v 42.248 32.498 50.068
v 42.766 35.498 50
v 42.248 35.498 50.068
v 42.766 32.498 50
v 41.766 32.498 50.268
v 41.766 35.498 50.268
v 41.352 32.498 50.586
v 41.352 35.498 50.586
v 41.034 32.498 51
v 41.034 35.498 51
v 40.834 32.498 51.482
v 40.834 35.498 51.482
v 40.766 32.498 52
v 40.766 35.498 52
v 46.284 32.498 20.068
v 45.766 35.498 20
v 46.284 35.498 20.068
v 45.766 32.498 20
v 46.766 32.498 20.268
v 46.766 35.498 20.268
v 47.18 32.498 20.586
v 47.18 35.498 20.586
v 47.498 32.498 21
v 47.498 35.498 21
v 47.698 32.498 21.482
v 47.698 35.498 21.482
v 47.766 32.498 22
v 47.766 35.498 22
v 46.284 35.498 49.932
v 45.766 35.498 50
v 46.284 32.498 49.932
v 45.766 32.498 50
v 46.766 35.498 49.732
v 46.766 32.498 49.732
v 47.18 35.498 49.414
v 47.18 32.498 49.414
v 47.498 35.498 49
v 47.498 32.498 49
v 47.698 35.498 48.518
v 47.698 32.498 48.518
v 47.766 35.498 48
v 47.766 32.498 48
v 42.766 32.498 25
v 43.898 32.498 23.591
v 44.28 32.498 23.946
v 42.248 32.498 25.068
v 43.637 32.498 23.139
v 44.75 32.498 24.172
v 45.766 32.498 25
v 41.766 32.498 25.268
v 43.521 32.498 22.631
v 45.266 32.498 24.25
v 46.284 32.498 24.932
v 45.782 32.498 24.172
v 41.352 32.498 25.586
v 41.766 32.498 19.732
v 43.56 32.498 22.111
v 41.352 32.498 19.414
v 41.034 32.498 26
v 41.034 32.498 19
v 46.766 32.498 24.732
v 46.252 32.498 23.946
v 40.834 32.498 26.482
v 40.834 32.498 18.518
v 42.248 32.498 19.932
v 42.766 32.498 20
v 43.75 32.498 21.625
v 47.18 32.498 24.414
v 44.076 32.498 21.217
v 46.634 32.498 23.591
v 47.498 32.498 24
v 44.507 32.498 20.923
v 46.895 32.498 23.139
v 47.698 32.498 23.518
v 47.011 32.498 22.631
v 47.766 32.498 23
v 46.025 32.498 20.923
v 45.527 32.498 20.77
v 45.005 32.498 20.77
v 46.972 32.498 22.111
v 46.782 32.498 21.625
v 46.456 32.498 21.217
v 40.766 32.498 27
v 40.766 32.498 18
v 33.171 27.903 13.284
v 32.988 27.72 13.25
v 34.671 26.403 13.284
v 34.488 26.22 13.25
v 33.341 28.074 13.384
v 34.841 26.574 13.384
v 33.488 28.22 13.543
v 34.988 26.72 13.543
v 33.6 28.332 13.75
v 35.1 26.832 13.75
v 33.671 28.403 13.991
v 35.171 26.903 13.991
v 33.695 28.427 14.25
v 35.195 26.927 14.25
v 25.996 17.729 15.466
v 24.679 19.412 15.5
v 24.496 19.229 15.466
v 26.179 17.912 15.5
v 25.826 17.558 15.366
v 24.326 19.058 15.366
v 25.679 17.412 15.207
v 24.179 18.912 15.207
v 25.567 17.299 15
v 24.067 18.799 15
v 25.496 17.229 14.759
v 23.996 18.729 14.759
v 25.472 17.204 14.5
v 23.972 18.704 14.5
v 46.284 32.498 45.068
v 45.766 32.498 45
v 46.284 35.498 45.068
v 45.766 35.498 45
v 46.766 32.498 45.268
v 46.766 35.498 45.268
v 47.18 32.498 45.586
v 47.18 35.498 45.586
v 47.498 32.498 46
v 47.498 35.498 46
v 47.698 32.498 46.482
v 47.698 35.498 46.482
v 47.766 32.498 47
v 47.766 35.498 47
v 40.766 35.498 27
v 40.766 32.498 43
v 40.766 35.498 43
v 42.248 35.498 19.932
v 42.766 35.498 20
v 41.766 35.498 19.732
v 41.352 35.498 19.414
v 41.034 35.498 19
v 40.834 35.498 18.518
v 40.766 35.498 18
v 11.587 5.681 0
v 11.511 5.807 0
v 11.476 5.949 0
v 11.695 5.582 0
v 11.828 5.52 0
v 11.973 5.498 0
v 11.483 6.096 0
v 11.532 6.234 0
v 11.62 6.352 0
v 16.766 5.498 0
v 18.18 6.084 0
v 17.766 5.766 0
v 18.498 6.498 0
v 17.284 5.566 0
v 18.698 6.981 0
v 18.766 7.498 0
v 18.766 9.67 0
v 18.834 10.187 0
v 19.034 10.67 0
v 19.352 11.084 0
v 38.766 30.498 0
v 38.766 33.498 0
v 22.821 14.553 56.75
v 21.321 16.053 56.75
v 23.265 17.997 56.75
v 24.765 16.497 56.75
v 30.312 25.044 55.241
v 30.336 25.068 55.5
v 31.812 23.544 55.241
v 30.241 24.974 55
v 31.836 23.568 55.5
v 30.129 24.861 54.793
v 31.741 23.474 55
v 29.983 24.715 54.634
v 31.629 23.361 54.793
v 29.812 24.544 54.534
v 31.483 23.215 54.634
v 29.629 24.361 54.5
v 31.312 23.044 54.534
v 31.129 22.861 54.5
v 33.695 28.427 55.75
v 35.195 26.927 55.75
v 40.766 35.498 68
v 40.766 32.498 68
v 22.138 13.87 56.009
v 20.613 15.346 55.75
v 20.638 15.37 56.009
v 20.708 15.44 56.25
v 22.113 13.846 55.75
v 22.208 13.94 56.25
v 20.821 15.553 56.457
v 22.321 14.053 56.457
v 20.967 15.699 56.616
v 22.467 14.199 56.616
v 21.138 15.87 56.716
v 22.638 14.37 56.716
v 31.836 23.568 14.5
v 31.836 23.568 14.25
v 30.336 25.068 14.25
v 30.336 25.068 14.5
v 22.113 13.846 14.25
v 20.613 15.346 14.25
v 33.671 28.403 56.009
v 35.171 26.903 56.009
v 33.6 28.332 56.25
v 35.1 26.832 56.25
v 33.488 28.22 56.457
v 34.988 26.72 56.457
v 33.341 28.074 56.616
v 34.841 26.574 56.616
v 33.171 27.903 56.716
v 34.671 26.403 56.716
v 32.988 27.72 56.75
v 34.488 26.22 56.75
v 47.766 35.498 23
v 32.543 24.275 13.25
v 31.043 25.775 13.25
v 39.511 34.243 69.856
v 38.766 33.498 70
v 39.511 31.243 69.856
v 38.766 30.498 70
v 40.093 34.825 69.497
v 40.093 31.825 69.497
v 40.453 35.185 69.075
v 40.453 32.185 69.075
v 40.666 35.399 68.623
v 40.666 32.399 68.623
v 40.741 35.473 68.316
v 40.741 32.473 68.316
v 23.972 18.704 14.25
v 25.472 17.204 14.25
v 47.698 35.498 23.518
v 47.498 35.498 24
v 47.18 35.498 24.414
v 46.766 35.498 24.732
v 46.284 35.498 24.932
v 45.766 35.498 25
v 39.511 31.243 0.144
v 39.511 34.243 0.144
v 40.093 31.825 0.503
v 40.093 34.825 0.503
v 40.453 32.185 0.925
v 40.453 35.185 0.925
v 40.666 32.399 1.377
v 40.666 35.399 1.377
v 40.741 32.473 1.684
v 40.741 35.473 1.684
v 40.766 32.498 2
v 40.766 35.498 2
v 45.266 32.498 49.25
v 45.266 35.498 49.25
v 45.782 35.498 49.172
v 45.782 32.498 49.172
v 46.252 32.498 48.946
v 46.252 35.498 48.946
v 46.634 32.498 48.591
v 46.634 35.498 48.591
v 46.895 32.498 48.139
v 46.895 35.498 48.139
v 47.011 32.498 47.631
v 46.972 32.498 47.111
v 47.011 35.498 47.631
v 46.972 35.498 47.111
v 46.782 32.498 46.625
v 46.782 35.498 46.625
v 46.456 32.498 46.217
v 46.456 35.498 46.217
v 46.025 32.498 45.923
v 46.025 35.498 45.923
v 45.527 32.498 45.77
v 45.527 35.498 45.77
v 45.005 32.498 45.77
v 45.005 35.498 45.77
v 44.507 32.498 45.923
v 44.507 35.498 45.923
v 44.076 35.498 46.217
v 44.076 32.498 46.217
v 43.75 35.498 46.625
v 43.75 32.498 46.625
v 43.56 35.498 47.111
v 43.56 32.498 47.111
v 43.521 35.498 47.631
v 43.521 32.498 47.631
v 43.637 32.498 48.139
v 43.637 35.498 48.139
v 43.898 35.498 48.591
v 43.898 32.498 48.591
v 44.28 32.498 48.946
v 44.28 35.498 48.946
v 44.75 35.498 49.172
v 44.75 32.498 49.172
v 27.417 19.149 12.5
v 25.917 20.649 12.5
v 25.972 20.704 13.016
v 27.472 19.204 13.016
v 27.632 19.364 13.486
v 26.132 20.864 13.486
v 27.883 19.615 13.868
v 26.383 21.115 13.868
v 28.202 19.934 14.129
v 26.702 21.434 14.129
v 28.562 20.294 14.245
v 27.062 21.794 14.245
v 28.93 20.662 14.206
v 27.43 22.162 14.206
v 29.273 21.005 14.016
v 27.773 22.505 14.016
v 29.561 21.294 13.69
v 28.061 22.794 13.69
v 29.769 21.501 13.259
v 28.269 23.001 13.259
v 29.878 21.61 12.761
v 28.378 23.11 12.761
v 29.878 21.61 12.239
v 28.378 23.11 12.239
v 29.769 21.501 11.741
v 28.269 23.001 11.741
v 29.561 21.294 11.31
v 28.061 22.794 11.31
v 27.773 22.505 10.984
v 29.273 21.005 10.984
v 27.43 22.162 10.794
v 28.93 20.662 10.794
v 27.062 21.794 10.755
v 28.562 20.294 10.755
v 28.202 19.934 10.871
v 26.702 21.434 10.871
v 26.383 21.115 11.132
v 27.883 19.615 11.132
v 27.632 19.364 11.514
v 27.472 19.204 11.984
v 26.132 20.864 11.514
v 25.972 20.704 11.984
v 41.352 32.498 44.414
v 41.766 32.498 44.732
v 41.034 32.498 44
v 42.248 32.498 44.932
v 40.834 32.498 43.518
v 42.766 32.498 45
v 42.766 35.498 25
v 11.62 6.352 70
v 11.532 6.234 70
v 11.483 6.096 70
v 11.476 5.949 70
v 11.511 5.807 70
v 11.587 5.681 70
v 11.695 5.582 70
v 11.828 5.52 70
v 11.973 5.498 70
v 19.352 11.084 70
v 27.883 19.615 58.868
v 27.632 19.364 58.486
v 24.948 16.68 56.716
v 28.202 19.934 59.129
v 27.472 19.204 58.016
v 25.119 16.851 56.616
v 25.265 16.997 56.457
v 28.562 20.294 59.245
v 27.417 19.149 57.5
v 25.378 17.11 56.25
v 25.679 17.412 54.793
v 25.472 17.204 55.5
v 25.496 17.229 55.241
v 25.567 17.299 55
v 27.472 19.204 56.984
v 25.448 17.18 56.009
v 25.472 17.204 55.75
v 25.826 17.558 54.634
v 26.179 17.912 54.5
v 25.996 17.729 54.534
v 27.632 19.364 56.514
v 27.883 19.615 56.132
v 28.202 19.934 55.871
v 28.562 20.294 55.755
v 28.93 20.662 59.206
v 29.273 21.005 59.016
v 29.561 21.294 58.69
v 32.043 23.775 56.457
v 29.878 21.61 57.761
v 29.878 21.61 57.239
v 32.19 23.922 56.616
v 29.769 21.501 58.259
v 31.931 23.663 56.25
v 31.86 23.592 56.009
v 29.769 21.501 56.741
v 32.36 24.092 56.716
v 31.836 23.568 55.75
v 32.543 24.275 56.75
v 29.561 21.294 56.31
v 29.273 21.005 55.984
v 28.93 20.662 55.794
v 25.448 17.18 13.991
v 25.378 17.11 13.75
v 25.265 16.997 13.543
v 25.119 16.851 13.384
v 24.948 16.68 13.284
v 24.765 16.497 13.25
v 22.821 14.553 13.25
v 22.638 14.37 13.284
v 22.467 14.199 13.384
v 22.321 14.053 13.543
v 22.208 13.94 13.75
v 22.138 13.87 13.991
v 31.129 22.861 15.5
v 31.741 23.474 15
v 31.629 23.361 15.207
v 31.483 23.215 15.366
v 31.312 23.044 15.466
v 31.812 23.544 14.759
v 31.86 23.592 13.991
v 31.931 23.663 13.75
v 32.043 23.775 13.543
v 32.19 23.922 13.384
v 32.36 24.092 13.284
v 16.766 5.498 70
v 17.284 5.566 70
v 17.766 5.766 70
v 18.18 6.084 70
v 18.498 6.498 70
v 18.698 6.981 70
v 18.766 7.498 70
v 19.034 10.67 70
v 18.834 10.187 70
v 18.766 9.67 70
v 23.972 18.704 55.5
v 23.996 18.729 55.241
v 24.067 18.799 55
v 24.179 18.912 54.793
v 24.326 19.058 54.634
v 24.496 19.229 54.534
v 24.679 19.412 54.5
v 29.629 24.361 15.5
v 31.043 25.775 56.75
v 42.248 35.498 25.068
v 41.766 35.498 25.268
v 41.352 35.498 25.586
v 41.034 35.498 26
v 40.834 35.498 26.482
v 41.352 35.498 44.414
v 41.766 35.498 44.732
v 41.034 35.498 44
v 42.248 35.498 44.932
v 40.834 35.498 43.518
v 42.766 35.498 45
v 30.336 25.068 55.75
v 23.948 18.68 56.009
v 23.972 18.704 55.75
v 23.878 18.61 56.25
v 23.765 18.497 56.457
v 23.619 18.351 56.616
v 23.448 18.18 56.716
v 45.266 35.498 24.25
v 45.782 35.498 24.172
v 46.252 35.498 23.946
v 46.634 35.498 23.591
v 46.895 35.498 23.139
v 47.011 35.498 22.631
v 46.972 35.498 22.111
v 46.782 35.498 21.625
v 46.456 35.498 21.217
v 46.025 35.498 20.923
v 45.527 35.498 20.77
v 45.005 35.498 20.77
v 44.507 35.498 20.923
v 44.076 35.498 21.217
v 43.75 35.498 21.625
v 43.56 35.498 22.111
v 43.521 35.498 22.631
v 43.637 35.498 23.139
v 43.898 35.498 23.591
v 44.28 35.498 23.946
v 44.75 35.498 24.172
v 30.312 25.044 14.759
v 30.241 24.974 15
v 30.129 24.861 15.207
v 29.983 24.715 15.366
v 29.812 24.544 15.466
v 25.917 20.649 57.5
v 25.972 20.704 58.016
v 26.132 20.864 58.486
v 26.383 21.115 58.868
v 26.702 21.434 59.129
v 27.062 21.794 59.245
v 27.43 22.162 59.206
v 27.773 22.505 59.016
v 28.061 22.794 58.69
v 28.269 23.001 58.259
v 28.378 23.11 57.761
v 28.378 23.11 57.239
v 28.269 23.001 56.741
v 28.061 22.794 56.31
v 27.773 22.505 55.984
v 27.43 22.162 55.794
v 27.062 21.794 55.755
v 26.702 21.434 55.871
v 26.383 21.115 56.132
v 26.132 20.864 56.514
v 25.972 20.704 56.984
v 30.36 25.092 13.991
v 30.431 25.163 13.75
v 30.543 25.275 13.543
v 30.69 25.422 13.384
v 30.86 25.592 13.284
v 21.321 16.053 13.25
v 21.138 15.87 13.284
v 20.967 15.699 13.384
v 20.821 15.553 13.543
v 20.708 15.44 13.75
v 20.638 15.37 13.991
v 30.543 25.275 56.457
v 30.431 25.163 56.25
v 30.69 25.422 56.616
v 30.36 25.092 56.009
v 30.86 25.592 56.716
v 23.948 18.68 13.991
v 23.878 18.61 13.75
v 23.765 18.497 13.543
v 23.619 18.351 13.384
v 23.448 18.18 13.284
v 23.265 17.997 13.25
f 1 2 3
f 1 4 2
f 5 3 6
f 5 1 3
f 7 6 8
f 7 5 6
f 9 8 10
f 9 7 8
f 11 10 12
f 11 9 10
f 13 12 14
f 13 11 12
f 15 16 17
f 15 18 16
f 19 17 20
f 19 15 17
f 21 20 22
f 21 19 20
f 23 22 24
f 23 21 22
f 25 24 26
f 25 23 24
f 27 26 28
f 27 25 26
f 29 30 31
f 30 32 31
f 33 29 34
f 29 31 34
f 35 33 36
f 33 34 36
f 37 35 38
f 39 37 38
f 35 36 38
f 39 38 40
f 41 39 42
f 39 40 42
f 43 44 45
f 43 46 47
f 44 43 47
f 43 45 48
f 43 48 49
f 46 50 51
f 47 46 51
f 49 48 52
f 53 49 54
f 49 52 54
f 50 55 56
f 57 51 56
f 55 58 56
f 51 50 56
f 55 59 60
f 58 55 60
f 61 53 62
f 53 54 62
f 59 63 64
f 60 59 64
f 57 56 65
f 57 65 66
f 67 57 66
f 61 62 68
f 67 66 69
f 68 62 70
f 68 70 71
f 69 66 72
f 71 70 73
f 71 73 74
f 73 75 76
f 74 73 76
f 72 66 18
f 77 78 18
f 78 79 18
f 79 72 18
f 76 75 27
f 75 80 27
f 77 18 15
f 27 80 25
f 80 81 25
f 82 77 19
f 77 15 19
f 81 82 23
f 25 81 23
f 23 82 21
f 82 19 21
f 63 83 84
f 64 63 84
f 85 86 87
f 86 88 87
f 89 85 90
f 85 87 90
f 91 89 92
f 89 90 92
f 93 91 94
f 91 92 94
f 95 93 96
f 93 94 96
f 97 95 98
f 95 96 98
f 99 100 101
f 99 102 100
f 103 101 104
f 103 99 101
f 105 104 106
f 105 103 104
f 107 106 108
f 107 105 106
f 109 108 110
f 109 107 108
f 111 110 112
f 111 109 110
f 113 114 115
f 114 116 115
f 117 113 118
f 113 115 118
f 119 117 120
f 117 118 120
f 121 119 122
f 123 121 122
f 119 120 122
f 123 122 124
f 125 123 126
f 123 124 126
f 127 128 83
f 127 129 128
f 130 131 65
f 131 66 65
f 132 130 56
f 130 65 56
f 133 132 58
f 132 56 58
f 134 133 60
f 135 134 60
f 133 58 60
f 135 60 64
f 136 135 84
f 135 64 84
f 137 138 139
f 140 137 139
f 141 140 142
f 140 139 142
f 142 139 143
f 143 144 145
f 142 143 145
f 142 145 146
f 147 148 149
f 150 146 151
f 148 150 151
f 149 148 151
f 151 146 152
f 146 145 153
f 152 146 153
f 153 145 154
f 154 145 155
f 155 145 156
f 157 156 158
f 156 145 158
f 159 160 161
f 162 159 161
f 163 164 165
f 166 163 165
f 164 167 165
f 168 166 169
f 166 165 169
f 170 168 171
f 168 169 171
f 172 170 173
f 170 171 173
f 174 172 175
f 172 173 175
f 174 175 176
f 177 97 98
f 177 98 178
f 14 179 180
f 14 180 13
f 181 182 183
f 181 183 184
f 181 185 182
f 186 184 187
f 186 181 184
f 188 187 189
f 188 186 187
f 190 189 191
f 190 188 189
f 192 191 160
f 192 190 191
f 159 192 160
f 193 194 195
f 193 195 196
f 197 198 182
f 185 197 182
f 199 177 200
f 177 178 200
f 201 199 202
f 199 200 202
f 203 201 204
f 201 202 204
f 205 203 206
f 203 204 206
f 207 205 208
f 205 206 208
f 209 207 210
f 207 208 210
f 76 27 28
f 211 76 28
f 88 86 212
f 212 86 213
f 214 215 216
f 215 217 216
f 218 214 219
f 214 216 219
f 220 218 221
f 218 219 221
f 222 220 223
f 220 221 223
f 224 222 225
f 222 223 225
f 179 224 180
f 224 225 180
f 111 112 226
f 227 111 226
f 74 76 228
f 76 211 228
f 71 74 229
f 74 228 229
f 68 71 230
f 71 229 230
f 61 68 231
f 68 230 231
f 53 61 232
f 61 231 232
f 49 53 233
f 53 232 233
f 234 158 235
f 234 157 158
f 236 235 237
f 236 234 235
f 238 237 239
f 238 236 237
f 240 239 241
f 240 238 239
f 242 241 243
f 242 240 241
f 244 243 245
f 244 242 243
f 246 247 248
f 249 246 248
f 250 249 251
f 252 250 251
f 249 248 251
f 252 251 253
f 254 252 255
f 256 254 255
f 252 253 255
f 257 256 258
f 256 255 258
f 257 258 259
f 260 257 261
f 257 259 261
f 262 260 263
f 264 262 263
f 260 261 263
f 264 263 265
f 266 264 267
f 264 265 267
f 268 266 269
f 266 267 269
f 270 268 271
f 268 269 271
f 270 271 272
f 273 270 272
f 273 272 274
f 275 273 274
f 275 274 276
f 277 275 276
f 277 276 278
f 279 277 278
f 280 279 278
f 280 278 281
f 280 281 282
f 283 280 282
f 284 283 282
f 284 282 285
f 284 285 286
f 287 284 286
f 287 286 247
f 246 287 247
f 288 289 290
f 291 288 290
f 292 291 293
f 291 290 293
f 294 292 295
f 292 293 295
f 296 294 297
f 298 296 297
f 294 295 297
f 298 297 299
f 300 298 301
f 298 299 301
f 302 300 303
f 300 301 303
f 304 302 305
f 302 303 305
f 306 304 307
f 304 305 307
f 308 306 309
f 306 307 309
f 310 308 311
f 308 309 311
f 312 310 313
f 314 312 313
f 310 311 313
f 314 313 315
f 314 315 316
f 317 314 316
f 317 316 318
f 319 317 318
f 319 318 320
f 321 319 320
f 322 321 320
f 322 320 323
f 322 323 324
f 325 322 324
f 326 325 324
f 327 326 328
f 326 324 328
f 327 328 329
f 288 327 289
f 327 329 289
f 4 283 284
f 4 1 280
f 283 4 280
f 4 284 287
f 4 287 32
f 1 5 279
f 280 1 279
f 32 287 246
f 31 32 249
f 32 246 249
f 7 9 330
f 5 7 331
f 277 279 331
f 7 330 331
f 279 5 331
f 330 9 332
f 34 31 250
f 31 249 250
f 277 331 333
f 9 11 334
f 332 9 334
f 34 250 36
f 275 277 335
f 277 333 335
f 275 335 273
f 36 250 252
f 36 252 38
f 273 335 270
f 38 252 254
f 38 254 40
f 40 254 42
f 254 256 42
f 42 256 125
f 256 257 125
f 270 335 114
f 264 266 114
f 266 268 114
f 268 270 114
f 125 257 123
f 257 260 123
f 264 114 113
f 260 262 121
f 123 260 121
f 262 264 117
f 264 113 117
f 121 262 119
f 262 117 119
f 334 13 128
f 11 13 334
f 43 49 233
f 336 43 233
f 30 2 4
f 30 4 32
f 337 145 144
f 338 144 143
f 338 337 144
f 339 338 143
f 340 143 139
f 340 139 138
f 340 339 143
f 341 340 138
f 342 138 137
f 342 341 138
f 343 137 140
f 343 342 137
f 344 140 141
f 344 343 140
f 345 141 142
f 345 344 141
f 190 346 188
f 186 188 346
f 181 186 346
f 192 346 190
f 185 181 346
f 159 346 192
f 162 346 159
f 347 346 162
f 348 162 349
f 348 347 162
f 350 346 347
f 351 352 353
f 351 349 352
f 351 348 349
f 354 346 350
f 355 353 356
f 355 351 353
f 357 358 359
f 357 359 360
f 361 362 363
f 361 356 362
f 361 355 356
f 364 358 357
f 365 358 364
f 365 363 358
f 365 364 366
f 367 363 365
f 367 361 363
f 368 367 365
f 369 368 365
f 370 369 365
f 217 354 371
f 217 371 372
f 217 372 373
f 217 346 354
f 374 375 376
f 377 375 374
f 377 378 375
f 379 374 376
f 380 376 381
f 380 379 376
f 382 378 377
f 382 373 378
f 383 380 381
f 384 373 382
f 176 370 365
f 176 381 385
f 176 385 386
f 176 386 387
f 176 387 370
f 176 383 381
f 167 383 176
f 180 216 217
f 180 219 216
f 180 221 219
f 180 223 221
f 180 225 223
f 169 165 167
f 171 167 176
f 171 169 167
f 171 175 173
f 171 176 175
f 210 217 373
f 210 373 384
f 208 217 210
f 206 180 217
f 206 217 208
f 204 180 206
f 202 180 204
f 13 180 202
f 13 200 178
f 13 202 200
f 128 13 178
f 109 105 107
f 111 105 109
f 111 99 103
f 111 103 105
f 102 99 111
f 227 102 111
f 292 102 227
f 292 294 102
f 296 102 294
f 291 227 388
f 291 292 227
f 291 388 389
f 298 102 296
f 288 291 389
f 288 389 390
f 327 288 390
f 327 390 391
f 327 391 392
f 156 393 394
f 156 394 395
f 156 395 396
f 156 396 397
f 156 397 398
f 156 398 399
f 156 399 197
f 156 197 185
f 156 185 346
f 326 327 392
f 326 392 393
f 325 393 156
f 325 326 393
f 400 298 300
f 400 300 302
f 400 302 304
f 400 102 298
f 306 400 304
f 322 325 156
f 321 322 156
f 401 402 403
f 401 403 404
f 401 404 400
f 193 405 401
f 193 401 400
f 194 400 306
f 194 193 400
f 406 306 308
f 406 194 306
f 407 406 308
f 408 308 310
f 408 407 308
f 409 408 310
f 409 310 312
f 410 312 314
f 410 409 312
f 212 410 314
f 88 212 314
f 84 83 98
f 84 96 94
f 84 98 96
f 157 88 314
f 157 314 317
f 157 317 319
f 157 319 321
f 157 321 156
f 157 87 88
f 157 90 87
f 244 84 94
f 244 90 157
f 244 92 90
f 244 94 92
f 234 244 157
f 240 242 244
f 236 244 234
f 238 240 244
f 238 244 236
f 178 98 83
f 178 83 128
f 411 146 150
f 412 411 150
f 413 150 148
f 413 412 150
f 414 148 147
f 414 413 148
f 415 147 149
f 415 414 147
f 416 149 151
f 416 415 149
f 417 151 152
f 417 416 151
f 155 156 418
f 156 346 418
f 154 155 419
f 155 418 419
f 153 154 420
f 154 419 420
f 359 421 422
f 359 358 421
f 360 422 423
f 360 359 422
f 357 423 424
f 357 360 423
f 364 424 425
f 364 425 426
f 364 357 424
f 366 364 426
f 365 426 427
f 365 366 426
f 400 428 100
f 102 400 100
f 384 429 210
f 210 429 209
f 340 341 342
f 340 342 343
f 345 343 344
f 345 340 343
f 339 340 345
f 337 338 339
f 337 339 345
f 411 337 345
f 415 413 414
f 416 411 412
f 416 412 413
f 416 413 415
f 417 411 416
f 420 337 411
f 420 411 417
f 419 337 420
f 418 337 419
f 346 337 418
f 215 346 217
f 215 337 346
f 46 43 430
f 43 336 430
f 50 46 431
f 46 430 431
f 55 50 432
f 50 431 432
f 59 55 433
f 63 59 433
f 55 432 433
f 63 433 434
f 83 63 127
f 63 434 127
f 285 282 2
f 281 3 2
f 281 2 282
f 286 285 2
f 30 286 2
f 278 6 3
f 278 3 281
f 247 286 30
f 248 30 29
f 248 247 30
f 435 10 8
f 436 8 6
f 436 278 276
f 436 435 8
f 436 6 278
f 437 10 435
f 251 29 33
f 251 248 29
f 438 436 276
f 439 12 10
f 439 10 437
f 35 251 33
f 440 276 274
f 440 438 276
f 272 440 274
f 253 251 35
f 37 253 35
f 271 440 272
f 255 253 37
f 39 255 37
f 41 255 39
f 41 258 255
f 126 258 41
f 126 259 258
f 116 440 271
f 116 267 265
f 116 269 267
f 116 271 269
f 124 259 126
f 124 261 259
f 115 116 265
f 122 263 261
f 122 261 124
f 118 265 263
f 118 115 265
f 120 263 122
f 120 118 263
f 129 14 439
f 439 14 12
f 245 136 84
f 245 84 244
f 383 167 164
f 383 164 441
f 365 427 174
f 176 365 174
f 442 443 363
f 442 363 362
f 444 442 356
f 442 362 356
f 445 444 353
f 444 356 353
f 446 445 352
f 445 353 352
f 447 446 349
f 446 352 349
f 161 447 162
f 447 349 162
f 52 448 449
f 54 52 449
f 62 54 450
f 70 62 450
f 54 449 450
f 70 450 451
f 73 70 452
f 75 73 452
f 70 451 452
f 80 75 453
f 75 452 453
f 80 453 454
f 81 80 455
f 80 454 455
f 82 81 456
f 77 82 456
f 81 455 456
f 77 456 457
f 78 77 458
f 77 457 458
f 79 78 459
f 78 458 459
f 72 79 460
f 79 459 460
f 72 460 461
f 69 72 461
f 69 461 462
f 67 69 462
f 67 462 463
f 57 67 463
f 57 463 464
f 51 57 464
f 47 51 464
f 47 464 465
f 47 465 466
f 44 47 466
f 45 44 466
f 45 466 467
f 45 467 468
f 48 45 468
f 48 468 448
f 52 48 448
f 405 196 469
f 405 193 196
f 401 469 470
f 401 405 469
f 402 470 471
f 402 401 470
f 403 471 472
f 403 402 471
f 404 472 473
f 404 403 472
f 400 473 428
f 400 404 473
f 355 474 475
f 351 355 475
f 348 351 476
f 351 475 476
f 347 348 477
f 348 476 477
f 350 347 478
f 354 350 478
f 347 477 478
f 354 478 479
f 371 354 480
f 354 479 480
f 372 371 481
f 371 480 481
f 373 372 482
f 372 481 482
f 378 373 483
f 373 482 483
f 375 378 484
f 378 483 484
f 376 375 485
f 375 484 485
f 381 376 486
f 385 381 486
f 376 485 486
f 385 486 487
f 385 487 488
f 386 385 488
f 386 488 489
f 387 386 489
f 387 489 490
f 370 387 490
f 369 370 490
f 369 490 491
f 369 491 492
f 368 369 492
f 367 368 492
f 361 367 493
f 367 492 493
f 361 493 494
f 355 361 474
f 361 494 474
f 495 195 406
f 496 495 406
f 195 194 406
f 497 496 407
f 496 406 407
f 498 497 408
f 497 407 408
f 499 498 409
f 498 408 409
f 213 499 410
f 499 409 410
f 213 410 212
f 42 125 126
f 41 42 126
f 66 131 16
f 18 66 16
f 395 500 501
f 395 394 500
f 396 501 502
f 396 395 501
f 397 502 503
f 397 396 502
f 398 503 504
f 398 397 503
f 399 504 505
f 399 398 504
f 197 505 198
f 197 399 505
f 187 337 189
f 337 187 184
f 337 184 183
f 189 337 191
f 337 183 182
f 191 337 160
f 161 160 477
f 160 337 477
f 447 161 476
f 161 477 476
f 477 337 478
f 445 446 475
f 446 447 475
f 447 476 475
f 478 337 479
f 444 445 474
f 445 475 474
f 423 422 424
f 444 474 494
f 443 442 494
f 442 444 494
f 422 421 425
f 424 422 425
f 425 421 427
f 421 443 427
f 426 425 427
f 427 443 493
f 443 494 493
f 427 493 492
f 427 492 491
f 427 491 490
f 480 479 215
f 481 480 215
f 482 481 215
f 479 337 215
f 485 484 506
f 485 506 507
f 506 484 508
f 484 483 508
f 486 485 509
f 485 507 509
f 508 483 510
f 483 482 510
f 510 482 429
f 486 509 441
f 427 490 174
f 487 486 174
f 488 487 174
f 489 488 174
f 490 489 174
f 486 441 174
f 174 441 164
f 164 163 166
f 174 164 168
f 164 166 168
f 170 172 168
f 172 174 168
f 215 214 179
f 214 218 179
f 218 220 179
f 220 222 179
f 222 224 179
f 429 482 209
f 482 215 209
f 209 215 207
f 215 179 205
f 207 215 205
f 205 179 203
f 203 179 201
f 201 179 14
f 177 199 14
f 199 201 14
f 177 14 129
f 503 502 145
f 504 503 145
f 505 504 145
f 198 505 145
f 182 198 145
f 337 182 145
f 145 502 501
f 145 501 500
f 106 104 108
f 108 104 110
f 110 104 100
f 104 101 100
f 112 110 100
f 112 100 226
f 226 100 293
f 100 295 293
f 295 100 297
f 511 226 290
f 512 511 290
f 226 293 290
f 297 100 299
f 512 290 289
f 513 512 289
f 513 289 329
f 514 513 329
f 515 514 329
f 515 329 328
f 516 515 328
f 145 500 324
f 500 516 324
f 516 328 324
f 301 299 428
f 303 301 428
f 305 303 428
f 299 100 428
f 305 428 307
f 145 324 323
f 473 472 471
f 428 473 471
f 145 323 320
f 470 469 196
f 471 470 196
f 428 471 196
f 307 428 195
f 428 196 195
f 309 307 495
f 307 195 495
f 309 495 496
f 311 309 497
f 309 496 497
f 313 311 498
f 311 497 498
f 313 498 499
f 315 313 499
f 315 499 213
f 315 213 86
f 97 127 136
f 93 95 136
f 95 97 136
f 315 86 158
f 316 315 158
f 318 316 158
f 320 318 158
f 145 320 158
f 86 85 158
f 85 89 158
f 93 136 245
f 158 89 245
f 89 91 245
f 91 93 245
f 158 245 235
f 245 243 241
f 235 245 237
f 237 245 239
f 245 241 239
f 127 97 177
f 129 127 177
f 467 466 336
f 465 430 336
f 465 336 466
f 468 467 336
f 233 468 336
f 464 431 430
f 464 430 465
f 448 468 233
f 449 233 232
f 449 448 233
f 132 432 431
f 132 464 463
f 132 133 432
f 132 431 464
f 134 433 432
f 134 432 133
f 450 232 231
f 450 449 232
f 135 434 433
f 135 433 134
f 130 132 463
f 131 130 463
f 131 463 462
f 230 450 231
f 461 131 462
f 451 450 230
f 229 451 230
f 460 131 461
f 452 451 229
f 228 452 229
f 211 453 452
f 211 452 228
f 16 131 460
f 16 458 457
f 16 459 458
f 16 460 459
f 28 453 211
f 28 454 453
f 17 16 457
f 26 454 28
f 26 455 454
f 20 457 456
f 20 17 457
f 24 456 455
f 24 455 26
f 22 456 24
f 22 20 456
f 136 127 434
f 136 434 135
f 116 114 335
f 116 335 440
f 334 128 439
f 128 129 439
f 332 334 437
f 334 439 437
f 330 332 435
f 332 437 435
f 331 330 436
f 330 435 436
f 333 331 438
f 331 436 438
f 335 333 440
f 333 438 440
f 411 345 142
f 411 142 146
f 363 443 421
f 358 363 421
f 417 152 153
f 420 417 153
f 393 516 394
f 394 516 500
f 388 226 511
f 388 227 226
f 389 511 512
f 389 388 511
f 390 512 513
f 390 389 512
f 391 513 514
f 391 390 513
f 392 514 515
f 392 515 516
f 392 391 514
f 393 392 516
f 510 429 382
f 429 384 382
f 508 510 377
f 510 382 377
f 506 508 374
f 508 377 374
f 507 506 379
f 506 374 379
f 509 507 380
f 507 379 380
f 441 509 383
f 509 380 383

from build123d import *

# Parameters (mm, degrees)
SKETCH_1_W          = 7
SKETCH_1_H          = 3
EXTRUDE_1_DEPTH     = 70
SKETCH_2_R          = 1.75
CUT_EXTRUDE_1_DEPTH = 70
SKETCH_3_W          = 7
SKETCH_3_H          = 20
CUT_EXTRUDE_2_DEPTH = 70
FILLET_1_R          = 2
FILLET_3_R          = 2
FILLET_4_R          = 2
FILLET_5_R          = 2
SKETCH_4_W          = 20
SKETCH_4_H          = 3
CUT_EXTRUDE_3_DEPTH = 7
FILLET_6_R          = 2
FILLET_7_R          = 0.5
SKETCH_5_W          = 53
SKETCH_5_H          = 18.5
CUT_EXTRUDE_4_DEPTH = 8
SKETCH_7_R          = 1.75
EXTRUDE_3_DEPTH     = 2.121320344
FILLET_9_R          = 1


with BuildPart() as part:
    # 草图1 → 凸台-拉伸1 (new body)
    with BuildSketch(Plane.XY):
        with Locations((44.266038526, 33.998202963)):
            Rectangle(SKETCH_1_W, SKETCH_1_H)
        Polygon((40.766038526, 32.498202963), (40.766038526, 35.498202963), (10.766038526, 5.498202963), (13.766038526, 5.498202963), (18.766038526, 10.498202963), align=None)
        Polygon((18.766038526, 5.498202963), (18.766038526, 10.498202963), (13.766038526, 5.498202963), align=None)
    extrude(amount=EXTRUDE_1_DEPTH)

    # 草图2 → 切除-拉伸1 (cut)
    with BuildSketch(Plane(origin=(0, 35.498202963, 0), x_dir=(1, 0, 0), z_dir=(0, 1, 0))):
        with Locations(Location((45.266038526, -22.5, 0), (0, 0, 270))):
            Circle(SKETCH_2_R)
        with Locations(Location((45.266038526, -47.5, 0), (0, 0, 270))):
            Circle(SKETCH_2_R)
    extrude(amount=-CUT_EXTRUDE_1_DEPTH, mode=Mode.SUBTRACT)

    # 草图3 → 切除-拉伸2 (cut)
    with BuildSketch(Plane(origin=(0, 35.498202963, 0), x_dir=(1, 0, 0), z_dir=(0, 1, 0))):
        with Locations((44.266038526, -10)):
            Rectangle(SKETCH_3_W, SKETCH_3_H)
        with Locations((44.266038526, -60)):
            Rectangle(SKETCH_3_W, SKETCH_3_H)
    extrude(amount=-CUT_EXTRUDE_2_DEPTH, mode=Mode.SUBTRACT)

    # 圆角1
    fillet_1_edges = [part.edges().sort_by_distance(p)[0] for p in [
        (40.766038526, 33.998202963, 20),
        (40.766038526, 33.998202963, 50),
    ]]
    fillet(fillet_1_edges, radius=FILLET_1_R)

    # 圆角3
    fillet_3_edges = [part.edges().sort_by_distance(p)[0] for p in [
        (40.766038526, 33.998202963, 0),
        (40.766038526, 33.998202963, 70),
    ]]
    fillet(fillet_3_edges, radius=FILLET_3_R)

    # 圆角4
    fillet_4_edges = [part.edges().sort_by_distance(p)[0] for p in [
        (18.766038526, 10.498202963, 35),
        (18.766038526, 5.498202963, 35),
    ]]
    fillet(fillet_4_edges, radius=FILLET_4_R)

    # 圆角5
    fillet_5_edges = [part.edges().sort_by_distance(p)[0] for p in [
        (47.766038526, 33.998202963, 20),
        (47.766038526, 33.998202963, 50),
    ]]
    fillet(fillet_5_edges, radius=FILLET_5_R)

    # 草图4 → 切除-拉伸3 (cut)
    with BuildSketch(Plane(origin=(47.766038526, 0, 0), x_dir=(0, 0, -1), z_dir=(1, 0, 0))):
        with Locations((-35, 33.998202963)):
            Rectangle(SKETCH_4_W, SKETCH_4_H)
    extrude(amount=-CUT_EXTRUDE_3_DEPTH, mode=Mode.SUBTRACT)

    # 圆角6
    fillet_6_edges = [part.edges().sort_by_distance(p)[0] for p in [
        (40.766038526, 33.998202963, 45),
        (40.766038526, 33.998202963, 25),
        (47.766038526, 33.998202963, 45),
        (47.766038526, 33.998202963, 25),
    ]]
    fillet(fillet_6_edges, radius=FILLET_6_R)

    # 圆角7
    fillet_7_edges = [part.edges().sort_by_distance(p)[0] for p in [
        (10.766038526, 5.498202963, 35),
    ]]
    fillet(fillet_7_edges, radius=FILLET_7_R)

    # 草图5 → 切除-拉伸4 (cut)
    with BuildSketch(Plane(origin=(2.633917782, -2.633917782, 0), x_dir=(0, 0, 1), z_dir=(-0.7071067811865477, 0.7071067811865475, 0))):
        with Locations((35, 34.676962319)):
            Rectangle(SKETCH_5_W, SKETCH_5_H)
    extrude(amount=-CUT_EXTRUDE_4_DEPTH, mode=Mode.SUBTRACT)

    # 草图7 → 凸台-拉伸3 (add)
    # profile 1 of 2: a face of its own
    with BuildSketch(Plane(origin=(2.633917782, -2.633917782, 0), x_dir=(0, 0, 1), z_dir=(-0.7071067811865477, 0.7071067811865475, 0))):
        Polygon((13.25, 39.176962319), (15.5, 39.176962319), (15.5, 30.176962319), (13.25, 30.176962319), (13.25, 25.426962319), (8.5, 25.426962319), (8.5, 43.926962319), (13.25, 43.926962319), align=None)
        with Locations(Location((12.5, 34.676962319, 0), (0, 0, 270))):
            Circle(SKETCH_7_R, mode=Mode.SUBTRACT)
    # profile 2 of 2: a face of its own
    with BuildSketch(Plane(origin=(2.633917782, -2.633917782, 0), x_dir=(0, 0, 1), z_dir=(-0.7071067811865477, 0.7071067811865475, 0))):
        Polygon((56.75, 30.176962319), (54.5, 30.176962319), (54.5, 39.176962319), (56.75, 39.176962319), (56.75, 43.926962319), (61.5, 43.926962319), (61.5, 35.176962319), (61.5, 25.426962319), (56.75, 25.426962319), align=None)
        with Locations(Location((57.5, 34.676962319, 0), (0, 0, 270))):
            Circle(SKETCH_7_R, mode=Mode.SUBTRACT)
    extrude(amount=-EXTRUDE_3_DEPTH)

    # 圆角9
    fillet_9_edges = [part.edges().sort_by_distance(p)[0] for p in [
        (34.444970714, 27.677135151, 13.25),
        (31.086213504, 24.31837794, 13.25),
        (31.086213504, 24.31837794, 15.5),
        (24.722252473, 17.954416909, 15.5),
        (24.722252473, 17.954416909, 13.25),
        (21.363495262, 14.595659699, 13.25),
        (21.363495262, 14.595659699, 56.75),
        (24.722252473, 17.954416909, 56.75),
        (24.722252473, 17.954416909, 54.5),
        (31.086213504, 24.31837794, 54.5),
        (31.086213504, 24.31837794, 56.75),
        (34.444970714, 27.677135151, 56.75),
    ]]
    fillet(fillet_9_edges, radius=FILLET_9_R)


solid = part.part
